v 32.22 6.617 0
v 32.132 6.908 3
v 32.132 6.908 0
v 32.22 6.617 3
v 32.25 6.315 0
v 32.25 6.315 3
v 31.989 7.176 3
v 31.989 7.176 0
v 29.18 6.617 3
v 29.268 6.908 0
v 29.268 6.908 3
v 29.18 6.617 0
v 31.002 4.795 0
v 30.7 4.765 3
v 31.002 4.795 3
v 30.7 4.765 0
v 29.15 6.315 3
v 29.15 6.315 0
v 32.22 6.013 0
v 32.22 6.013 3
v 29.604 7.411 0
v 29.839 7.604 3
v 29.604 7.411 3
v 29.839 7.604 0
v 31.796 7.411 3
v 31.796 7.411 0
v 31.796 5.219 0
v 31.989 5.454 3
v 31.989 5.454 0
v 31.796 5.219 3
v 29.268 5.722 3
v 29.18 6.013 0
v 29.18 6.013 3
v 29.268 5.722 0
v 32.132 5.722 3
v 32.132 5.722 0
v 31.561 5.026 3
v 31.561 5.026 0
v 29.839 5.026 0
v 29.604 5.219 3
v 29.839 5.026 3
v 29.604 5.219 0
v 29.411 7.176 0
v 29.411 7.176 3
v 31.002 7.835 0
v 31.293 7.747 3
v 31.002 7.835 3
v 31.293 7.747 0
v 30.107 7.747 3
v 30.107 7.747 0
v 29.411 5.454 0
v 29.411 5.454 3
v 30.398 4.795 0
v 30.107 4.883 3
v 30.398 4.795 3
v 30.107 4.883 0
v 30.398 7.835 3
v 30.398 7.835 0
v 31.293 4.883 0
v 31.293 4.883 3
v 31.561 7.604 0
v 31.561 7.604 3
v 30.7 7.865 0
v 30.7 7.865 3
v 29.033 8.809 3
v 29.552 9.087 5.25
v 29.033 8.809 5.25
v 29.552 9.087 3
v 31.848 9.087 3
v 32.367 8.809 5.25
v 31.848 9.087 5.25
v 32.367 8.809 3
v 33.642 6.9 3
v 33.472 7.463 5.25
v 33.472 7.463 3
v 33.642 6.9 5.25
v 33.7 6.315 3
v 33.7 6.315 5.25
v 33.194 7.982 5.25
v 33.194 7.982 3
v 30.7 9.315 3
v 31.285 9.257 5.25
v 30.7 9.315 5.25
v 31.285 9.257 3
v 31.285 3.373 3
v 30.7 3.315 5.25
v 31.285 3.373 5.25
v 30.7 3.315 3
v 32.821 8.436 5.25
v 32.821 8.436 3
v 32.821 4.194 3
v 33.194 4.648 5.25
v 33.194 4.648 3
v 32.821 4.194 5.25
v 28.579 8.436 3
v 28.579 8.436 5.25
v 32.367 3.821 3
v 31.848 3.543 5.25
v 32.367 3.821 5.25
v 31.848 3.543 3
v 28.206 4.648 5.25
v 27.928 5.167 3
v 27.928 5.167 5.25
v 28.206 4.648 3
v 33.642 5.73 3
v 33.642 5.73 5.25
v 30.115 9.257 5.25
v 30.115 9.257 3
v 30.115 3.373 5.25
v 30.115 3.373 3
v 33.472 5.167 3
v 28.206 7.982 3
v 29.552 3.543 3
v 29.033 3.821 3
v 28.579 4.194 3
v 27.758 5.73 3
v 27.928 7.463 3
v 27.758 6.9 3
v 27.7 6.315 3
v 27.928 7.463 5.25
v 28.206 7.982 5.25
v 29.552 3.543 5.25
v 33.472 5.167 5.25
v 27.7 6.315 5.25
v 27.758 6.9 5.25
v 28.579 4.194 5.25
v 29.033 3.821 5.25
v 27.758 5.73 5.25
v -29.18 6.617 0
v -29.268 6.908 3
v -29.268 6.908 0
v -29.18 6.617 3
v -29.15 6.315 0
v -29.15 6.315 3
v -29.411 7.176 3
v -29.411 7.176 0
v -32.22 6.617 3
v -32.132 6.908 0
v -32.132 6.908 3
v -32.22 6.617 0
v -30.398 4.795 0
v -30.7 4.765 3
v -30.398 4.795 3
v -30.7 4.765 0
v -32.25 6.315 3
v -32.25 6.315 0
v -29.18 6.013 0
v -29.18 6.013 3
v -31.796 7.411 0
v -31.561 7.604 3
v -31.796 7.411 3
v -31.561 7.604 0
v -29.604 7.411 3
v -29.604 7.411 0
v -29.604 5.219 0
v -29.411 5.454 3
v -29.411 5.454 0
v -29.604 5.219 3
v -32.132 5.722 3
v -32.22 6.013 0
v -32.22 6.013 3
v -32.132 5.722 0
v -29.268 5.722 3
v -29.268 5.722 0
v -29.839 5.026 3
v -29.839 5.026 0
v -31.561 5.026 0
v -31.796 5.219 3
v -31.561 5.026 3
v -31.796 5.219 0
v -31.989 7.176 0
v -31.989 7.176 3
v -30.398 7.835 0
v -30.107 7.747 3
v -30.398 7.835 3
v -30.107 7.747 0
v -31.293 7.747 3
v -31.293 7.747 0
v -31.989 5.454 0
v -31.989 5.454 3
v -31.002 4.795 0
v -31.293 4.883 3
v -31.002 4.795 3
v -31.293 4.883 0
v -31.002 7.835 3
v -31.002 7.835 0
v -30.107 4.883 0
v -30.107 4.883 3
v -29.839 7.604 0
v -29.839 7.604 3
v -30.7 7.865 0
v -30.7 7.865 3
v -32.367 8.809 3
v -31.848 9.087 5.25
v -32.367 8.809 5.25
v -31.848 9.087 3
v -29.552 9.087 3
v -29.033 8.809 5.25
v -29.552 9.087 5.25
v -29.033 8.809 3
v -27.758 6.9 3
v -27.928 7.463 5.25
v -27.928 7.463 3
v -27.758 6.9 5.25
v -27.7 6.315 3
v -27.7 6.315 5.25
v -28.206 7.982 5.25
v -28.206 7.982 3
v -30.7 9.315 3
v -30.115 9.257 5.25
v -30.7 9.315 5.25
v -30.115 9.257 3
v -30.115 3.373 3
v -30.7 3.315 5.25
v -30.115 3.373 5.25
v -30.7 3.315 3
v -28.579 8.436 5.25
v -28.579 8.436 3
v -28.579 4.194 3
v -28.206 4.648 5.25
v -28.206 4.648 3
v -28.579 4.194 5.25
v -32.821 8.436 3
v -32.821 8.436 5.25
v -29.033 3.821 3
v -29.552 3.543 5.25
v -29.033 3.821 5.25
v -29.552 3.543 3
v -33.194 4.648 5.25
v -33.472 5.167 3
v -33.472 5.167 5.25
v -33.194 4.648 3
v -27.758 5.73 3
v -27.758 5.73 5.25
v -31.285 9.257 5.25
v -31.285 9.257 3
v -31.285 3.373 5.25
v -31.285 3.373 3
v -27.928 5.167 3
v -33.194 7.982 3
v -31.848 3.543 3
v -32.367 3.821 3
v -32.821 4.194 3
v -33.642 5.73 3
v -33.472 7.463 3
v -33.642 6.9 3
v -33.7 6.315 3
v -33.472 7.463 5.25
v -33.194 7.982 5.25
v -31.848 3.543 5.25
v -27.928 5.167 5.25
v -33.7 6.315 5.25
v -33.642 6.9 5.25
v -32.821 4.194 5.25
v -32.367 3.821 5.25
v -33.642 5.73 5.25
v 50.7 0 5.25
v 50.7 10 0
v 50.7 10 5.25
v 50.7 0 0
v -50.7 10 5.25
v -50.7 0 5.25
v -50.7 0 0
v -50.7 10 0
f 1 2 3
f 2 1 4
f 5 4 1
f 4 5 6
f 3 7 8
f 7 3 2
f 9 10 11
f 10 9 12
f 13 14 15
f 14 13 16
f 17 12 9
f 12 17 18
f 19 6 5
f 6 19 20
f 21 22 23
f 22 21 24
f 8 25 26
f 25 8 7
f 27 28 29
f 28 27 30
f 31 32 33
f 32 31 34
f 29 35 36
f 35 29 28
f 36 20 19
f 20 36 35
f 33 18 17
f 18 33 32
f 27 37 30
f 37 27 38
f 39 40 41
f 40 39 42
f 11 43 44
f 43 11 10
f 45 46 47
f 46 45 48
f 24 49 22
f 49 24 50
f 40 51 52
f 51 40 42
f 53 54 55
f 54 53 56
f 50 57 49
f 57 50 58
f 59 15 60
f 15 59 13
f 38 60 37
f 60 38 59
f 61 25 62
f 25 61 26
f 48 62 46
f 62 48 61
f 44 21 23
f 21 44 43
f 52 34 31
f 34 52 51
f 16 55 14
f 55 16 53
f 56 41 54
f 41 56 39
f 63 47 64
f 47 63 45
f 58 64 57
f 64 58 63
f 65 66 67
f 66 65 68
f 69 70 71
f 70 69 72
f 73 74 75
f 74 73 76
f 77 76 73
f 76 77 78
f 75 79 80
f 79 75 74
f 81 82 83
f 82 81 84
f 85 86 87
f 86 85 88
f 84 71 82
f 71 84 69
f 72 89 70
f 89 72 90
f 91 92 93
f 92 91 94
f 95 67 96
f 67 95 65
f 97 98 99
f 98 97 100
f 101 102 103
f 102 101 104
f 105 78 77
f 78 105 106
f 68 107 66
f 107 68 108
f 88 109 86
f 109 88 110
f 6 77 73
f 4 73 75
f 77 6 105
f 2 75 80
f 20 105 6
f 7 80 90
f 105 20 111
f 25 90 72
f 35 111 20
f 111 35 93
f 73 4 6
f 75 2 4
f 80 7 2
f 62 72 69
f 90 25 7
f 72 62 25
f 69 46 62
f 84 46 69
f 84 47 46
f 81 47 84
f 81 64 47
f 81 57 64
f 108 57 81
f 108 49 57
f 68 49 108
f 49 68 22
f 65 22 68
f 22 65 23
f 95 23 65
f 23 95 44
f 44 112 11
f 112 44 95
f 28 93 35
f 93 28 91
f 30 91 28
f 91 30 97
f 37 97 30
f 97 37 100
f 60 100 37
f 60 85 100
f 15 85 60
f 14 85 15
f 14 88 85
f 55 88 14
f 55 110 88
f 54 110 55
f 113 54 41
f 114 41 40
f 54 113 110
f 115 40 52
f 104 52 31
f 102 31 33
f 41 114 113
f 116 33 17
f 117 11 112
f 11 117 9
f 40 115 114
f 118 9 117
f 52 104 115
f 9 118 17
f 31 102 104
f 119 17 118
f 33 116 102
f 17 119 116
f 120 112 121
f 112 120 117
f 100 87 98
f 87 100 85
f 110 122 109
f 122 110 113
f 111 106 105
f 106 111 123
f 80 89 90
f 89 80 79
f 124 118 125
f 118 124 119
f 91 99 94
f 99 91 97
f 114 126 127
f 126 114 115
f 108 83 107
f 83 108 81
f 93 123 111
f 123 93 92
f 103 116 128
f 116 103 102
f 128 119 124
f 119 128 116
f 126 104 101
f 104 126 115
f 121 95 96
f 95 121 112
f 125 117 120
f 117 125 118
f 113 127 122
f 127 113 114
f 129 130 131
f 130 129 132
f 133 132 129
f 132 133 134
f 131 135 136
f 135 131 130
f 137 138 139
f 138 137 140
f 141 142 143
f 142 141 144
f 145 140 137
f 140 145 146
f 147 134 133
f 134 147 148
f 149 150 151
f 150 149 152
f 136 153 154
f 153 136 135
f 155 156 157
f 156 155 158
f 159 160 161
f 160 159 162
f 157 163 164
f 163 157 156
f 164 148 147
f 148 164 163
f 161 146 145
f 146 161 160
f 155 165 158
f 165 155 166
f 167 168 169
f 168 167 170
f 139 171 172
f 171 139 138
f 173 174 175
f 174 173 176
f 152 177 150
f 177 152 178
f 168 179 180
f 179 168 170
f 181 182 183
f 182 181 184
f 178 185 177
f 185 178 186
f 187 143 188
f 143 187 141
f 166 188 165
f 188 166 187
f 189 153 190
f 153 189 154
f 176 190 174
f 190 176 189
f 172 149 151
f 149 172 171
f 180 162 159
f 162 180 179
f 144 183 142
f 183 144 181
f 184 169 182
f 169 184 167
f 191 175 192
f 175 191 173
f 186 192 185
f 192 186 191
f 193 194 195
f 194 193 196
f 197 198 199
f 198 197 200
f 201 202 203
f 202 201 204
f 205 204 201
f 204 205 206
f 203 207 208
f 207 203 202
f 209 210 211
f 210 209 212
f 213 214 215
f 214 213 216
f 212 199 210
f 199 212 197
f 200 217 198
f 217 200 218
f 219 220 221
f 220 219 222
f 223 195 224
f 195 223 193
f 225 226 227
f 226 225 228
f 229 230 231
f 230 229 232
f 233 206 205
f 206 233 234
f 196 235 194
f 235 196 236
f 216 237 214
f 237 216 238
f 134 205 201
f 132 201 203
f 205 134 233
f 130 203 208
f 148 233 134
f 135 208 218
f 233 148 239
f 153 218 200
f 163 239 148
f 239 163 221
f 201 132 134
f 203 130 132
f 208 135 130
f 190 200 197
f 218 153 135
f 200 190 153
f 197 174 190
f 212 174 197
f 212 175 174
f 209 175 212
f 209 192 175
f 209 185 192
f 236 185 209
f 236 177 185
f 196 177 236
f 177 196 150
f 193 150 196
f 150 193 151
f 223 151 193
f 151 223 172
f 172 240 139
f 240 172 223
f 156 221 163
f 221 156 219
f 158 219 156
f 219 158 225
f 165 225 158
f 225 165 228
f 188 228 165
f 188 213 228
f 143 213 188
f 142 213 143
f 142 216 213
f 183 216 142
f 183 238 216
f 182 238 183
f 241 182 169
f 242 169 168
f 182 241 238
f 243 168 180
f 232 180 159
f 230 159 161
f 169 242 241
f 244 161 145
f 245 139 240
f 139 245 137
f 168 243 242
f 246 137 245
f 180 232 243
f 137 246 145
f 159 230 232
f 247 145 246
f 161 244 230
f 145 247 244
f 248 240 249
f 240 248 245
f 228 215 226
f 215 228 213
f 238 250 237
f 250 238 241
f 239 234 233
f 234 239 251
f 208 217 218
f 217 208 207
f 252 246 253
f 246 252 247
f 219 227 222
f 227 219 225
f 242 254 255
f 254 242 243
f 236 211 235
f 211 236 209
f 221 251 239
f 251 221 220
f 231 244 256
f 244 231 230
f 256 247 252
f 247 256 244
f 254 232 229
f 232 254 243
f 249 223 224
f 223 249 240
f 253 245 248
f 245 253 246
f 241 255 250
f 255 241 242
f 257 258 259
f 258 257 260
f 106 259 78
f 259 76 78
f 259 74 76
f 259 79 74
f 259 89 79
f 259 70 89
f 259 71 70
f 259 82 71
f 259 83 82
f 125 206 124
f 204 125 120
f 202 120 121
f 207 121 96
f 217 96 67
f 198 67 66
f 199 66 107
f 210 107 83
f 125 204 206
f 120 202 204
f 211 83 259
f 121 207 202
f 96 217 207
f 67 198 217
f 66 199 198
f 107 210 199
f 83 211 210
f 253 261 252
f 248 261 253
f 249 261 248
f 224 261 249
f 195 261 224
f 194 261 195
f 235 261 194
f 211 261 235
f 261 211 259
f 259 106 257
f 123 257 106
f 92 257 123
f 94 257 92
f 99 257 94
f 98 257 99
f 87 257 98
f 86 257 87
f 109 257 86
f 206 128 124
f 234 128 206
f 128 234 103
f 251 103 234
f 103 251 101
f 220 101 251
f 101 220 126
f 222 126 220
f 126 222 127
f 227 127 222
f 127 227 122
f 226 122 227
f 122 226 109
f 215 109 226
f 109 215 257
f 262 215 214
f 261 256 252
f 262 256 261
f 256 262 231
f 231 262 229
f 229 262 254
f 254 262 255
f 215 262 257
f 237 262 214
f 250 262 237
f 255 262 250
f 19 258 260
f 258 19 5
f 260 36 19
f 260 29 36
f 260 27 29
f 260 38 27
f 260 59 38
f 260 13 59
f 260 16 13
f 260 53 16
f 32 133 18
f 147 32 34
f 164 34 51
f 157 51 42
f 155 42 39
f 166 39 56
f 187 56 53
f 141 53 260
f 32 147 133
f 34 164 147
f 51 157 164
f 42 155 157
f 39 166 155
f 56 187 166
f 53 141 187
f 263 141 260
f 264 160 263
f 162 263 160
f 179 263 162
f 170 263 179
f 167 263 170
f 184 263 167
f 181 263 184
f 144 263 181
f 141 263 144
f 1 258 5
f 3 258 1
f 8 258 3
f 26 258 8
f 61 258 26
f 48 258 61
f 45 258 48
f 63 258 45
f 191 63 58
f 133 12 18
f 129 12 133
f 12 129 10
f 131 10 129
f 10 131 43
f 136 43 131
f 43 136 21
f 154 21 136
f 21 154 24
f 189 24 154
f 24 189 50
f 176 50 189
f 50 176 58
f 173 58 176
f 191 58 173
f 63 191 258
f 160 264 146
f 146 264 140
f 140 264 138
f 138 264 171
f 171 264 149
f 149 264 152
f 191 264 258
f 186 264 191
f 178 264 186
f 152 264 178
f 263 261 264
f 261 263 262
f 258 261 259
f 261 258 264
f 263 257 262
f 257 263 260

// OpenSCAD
sonyHeight = 30;
gotekHeight = 24.75;

extraHeight = sonyHeight-gotekHeight;
frontLip = 2.63;
width = 101.4;
depth = 10;
thickness = 9.8;
screwHead = 6;
screwHeadFromBottom = 3;
screwFromSide = 20;
screwHole = 3.1;

$fn = 32;
difference() {
    translate([-width/2,0,0]) cube([width,depth,extraHeight]);
    for (s=[1,-1]) translate([s*(width/2-screwFromSide),(frontLip+depth)/2]) {
        cylinder(h=extraHeight*3,d=screwHole,center=true);
        translate([0,0,screwHeadFromBottom]) cylinder(h=extraHeight*3,d=screwHead);
    }
}
